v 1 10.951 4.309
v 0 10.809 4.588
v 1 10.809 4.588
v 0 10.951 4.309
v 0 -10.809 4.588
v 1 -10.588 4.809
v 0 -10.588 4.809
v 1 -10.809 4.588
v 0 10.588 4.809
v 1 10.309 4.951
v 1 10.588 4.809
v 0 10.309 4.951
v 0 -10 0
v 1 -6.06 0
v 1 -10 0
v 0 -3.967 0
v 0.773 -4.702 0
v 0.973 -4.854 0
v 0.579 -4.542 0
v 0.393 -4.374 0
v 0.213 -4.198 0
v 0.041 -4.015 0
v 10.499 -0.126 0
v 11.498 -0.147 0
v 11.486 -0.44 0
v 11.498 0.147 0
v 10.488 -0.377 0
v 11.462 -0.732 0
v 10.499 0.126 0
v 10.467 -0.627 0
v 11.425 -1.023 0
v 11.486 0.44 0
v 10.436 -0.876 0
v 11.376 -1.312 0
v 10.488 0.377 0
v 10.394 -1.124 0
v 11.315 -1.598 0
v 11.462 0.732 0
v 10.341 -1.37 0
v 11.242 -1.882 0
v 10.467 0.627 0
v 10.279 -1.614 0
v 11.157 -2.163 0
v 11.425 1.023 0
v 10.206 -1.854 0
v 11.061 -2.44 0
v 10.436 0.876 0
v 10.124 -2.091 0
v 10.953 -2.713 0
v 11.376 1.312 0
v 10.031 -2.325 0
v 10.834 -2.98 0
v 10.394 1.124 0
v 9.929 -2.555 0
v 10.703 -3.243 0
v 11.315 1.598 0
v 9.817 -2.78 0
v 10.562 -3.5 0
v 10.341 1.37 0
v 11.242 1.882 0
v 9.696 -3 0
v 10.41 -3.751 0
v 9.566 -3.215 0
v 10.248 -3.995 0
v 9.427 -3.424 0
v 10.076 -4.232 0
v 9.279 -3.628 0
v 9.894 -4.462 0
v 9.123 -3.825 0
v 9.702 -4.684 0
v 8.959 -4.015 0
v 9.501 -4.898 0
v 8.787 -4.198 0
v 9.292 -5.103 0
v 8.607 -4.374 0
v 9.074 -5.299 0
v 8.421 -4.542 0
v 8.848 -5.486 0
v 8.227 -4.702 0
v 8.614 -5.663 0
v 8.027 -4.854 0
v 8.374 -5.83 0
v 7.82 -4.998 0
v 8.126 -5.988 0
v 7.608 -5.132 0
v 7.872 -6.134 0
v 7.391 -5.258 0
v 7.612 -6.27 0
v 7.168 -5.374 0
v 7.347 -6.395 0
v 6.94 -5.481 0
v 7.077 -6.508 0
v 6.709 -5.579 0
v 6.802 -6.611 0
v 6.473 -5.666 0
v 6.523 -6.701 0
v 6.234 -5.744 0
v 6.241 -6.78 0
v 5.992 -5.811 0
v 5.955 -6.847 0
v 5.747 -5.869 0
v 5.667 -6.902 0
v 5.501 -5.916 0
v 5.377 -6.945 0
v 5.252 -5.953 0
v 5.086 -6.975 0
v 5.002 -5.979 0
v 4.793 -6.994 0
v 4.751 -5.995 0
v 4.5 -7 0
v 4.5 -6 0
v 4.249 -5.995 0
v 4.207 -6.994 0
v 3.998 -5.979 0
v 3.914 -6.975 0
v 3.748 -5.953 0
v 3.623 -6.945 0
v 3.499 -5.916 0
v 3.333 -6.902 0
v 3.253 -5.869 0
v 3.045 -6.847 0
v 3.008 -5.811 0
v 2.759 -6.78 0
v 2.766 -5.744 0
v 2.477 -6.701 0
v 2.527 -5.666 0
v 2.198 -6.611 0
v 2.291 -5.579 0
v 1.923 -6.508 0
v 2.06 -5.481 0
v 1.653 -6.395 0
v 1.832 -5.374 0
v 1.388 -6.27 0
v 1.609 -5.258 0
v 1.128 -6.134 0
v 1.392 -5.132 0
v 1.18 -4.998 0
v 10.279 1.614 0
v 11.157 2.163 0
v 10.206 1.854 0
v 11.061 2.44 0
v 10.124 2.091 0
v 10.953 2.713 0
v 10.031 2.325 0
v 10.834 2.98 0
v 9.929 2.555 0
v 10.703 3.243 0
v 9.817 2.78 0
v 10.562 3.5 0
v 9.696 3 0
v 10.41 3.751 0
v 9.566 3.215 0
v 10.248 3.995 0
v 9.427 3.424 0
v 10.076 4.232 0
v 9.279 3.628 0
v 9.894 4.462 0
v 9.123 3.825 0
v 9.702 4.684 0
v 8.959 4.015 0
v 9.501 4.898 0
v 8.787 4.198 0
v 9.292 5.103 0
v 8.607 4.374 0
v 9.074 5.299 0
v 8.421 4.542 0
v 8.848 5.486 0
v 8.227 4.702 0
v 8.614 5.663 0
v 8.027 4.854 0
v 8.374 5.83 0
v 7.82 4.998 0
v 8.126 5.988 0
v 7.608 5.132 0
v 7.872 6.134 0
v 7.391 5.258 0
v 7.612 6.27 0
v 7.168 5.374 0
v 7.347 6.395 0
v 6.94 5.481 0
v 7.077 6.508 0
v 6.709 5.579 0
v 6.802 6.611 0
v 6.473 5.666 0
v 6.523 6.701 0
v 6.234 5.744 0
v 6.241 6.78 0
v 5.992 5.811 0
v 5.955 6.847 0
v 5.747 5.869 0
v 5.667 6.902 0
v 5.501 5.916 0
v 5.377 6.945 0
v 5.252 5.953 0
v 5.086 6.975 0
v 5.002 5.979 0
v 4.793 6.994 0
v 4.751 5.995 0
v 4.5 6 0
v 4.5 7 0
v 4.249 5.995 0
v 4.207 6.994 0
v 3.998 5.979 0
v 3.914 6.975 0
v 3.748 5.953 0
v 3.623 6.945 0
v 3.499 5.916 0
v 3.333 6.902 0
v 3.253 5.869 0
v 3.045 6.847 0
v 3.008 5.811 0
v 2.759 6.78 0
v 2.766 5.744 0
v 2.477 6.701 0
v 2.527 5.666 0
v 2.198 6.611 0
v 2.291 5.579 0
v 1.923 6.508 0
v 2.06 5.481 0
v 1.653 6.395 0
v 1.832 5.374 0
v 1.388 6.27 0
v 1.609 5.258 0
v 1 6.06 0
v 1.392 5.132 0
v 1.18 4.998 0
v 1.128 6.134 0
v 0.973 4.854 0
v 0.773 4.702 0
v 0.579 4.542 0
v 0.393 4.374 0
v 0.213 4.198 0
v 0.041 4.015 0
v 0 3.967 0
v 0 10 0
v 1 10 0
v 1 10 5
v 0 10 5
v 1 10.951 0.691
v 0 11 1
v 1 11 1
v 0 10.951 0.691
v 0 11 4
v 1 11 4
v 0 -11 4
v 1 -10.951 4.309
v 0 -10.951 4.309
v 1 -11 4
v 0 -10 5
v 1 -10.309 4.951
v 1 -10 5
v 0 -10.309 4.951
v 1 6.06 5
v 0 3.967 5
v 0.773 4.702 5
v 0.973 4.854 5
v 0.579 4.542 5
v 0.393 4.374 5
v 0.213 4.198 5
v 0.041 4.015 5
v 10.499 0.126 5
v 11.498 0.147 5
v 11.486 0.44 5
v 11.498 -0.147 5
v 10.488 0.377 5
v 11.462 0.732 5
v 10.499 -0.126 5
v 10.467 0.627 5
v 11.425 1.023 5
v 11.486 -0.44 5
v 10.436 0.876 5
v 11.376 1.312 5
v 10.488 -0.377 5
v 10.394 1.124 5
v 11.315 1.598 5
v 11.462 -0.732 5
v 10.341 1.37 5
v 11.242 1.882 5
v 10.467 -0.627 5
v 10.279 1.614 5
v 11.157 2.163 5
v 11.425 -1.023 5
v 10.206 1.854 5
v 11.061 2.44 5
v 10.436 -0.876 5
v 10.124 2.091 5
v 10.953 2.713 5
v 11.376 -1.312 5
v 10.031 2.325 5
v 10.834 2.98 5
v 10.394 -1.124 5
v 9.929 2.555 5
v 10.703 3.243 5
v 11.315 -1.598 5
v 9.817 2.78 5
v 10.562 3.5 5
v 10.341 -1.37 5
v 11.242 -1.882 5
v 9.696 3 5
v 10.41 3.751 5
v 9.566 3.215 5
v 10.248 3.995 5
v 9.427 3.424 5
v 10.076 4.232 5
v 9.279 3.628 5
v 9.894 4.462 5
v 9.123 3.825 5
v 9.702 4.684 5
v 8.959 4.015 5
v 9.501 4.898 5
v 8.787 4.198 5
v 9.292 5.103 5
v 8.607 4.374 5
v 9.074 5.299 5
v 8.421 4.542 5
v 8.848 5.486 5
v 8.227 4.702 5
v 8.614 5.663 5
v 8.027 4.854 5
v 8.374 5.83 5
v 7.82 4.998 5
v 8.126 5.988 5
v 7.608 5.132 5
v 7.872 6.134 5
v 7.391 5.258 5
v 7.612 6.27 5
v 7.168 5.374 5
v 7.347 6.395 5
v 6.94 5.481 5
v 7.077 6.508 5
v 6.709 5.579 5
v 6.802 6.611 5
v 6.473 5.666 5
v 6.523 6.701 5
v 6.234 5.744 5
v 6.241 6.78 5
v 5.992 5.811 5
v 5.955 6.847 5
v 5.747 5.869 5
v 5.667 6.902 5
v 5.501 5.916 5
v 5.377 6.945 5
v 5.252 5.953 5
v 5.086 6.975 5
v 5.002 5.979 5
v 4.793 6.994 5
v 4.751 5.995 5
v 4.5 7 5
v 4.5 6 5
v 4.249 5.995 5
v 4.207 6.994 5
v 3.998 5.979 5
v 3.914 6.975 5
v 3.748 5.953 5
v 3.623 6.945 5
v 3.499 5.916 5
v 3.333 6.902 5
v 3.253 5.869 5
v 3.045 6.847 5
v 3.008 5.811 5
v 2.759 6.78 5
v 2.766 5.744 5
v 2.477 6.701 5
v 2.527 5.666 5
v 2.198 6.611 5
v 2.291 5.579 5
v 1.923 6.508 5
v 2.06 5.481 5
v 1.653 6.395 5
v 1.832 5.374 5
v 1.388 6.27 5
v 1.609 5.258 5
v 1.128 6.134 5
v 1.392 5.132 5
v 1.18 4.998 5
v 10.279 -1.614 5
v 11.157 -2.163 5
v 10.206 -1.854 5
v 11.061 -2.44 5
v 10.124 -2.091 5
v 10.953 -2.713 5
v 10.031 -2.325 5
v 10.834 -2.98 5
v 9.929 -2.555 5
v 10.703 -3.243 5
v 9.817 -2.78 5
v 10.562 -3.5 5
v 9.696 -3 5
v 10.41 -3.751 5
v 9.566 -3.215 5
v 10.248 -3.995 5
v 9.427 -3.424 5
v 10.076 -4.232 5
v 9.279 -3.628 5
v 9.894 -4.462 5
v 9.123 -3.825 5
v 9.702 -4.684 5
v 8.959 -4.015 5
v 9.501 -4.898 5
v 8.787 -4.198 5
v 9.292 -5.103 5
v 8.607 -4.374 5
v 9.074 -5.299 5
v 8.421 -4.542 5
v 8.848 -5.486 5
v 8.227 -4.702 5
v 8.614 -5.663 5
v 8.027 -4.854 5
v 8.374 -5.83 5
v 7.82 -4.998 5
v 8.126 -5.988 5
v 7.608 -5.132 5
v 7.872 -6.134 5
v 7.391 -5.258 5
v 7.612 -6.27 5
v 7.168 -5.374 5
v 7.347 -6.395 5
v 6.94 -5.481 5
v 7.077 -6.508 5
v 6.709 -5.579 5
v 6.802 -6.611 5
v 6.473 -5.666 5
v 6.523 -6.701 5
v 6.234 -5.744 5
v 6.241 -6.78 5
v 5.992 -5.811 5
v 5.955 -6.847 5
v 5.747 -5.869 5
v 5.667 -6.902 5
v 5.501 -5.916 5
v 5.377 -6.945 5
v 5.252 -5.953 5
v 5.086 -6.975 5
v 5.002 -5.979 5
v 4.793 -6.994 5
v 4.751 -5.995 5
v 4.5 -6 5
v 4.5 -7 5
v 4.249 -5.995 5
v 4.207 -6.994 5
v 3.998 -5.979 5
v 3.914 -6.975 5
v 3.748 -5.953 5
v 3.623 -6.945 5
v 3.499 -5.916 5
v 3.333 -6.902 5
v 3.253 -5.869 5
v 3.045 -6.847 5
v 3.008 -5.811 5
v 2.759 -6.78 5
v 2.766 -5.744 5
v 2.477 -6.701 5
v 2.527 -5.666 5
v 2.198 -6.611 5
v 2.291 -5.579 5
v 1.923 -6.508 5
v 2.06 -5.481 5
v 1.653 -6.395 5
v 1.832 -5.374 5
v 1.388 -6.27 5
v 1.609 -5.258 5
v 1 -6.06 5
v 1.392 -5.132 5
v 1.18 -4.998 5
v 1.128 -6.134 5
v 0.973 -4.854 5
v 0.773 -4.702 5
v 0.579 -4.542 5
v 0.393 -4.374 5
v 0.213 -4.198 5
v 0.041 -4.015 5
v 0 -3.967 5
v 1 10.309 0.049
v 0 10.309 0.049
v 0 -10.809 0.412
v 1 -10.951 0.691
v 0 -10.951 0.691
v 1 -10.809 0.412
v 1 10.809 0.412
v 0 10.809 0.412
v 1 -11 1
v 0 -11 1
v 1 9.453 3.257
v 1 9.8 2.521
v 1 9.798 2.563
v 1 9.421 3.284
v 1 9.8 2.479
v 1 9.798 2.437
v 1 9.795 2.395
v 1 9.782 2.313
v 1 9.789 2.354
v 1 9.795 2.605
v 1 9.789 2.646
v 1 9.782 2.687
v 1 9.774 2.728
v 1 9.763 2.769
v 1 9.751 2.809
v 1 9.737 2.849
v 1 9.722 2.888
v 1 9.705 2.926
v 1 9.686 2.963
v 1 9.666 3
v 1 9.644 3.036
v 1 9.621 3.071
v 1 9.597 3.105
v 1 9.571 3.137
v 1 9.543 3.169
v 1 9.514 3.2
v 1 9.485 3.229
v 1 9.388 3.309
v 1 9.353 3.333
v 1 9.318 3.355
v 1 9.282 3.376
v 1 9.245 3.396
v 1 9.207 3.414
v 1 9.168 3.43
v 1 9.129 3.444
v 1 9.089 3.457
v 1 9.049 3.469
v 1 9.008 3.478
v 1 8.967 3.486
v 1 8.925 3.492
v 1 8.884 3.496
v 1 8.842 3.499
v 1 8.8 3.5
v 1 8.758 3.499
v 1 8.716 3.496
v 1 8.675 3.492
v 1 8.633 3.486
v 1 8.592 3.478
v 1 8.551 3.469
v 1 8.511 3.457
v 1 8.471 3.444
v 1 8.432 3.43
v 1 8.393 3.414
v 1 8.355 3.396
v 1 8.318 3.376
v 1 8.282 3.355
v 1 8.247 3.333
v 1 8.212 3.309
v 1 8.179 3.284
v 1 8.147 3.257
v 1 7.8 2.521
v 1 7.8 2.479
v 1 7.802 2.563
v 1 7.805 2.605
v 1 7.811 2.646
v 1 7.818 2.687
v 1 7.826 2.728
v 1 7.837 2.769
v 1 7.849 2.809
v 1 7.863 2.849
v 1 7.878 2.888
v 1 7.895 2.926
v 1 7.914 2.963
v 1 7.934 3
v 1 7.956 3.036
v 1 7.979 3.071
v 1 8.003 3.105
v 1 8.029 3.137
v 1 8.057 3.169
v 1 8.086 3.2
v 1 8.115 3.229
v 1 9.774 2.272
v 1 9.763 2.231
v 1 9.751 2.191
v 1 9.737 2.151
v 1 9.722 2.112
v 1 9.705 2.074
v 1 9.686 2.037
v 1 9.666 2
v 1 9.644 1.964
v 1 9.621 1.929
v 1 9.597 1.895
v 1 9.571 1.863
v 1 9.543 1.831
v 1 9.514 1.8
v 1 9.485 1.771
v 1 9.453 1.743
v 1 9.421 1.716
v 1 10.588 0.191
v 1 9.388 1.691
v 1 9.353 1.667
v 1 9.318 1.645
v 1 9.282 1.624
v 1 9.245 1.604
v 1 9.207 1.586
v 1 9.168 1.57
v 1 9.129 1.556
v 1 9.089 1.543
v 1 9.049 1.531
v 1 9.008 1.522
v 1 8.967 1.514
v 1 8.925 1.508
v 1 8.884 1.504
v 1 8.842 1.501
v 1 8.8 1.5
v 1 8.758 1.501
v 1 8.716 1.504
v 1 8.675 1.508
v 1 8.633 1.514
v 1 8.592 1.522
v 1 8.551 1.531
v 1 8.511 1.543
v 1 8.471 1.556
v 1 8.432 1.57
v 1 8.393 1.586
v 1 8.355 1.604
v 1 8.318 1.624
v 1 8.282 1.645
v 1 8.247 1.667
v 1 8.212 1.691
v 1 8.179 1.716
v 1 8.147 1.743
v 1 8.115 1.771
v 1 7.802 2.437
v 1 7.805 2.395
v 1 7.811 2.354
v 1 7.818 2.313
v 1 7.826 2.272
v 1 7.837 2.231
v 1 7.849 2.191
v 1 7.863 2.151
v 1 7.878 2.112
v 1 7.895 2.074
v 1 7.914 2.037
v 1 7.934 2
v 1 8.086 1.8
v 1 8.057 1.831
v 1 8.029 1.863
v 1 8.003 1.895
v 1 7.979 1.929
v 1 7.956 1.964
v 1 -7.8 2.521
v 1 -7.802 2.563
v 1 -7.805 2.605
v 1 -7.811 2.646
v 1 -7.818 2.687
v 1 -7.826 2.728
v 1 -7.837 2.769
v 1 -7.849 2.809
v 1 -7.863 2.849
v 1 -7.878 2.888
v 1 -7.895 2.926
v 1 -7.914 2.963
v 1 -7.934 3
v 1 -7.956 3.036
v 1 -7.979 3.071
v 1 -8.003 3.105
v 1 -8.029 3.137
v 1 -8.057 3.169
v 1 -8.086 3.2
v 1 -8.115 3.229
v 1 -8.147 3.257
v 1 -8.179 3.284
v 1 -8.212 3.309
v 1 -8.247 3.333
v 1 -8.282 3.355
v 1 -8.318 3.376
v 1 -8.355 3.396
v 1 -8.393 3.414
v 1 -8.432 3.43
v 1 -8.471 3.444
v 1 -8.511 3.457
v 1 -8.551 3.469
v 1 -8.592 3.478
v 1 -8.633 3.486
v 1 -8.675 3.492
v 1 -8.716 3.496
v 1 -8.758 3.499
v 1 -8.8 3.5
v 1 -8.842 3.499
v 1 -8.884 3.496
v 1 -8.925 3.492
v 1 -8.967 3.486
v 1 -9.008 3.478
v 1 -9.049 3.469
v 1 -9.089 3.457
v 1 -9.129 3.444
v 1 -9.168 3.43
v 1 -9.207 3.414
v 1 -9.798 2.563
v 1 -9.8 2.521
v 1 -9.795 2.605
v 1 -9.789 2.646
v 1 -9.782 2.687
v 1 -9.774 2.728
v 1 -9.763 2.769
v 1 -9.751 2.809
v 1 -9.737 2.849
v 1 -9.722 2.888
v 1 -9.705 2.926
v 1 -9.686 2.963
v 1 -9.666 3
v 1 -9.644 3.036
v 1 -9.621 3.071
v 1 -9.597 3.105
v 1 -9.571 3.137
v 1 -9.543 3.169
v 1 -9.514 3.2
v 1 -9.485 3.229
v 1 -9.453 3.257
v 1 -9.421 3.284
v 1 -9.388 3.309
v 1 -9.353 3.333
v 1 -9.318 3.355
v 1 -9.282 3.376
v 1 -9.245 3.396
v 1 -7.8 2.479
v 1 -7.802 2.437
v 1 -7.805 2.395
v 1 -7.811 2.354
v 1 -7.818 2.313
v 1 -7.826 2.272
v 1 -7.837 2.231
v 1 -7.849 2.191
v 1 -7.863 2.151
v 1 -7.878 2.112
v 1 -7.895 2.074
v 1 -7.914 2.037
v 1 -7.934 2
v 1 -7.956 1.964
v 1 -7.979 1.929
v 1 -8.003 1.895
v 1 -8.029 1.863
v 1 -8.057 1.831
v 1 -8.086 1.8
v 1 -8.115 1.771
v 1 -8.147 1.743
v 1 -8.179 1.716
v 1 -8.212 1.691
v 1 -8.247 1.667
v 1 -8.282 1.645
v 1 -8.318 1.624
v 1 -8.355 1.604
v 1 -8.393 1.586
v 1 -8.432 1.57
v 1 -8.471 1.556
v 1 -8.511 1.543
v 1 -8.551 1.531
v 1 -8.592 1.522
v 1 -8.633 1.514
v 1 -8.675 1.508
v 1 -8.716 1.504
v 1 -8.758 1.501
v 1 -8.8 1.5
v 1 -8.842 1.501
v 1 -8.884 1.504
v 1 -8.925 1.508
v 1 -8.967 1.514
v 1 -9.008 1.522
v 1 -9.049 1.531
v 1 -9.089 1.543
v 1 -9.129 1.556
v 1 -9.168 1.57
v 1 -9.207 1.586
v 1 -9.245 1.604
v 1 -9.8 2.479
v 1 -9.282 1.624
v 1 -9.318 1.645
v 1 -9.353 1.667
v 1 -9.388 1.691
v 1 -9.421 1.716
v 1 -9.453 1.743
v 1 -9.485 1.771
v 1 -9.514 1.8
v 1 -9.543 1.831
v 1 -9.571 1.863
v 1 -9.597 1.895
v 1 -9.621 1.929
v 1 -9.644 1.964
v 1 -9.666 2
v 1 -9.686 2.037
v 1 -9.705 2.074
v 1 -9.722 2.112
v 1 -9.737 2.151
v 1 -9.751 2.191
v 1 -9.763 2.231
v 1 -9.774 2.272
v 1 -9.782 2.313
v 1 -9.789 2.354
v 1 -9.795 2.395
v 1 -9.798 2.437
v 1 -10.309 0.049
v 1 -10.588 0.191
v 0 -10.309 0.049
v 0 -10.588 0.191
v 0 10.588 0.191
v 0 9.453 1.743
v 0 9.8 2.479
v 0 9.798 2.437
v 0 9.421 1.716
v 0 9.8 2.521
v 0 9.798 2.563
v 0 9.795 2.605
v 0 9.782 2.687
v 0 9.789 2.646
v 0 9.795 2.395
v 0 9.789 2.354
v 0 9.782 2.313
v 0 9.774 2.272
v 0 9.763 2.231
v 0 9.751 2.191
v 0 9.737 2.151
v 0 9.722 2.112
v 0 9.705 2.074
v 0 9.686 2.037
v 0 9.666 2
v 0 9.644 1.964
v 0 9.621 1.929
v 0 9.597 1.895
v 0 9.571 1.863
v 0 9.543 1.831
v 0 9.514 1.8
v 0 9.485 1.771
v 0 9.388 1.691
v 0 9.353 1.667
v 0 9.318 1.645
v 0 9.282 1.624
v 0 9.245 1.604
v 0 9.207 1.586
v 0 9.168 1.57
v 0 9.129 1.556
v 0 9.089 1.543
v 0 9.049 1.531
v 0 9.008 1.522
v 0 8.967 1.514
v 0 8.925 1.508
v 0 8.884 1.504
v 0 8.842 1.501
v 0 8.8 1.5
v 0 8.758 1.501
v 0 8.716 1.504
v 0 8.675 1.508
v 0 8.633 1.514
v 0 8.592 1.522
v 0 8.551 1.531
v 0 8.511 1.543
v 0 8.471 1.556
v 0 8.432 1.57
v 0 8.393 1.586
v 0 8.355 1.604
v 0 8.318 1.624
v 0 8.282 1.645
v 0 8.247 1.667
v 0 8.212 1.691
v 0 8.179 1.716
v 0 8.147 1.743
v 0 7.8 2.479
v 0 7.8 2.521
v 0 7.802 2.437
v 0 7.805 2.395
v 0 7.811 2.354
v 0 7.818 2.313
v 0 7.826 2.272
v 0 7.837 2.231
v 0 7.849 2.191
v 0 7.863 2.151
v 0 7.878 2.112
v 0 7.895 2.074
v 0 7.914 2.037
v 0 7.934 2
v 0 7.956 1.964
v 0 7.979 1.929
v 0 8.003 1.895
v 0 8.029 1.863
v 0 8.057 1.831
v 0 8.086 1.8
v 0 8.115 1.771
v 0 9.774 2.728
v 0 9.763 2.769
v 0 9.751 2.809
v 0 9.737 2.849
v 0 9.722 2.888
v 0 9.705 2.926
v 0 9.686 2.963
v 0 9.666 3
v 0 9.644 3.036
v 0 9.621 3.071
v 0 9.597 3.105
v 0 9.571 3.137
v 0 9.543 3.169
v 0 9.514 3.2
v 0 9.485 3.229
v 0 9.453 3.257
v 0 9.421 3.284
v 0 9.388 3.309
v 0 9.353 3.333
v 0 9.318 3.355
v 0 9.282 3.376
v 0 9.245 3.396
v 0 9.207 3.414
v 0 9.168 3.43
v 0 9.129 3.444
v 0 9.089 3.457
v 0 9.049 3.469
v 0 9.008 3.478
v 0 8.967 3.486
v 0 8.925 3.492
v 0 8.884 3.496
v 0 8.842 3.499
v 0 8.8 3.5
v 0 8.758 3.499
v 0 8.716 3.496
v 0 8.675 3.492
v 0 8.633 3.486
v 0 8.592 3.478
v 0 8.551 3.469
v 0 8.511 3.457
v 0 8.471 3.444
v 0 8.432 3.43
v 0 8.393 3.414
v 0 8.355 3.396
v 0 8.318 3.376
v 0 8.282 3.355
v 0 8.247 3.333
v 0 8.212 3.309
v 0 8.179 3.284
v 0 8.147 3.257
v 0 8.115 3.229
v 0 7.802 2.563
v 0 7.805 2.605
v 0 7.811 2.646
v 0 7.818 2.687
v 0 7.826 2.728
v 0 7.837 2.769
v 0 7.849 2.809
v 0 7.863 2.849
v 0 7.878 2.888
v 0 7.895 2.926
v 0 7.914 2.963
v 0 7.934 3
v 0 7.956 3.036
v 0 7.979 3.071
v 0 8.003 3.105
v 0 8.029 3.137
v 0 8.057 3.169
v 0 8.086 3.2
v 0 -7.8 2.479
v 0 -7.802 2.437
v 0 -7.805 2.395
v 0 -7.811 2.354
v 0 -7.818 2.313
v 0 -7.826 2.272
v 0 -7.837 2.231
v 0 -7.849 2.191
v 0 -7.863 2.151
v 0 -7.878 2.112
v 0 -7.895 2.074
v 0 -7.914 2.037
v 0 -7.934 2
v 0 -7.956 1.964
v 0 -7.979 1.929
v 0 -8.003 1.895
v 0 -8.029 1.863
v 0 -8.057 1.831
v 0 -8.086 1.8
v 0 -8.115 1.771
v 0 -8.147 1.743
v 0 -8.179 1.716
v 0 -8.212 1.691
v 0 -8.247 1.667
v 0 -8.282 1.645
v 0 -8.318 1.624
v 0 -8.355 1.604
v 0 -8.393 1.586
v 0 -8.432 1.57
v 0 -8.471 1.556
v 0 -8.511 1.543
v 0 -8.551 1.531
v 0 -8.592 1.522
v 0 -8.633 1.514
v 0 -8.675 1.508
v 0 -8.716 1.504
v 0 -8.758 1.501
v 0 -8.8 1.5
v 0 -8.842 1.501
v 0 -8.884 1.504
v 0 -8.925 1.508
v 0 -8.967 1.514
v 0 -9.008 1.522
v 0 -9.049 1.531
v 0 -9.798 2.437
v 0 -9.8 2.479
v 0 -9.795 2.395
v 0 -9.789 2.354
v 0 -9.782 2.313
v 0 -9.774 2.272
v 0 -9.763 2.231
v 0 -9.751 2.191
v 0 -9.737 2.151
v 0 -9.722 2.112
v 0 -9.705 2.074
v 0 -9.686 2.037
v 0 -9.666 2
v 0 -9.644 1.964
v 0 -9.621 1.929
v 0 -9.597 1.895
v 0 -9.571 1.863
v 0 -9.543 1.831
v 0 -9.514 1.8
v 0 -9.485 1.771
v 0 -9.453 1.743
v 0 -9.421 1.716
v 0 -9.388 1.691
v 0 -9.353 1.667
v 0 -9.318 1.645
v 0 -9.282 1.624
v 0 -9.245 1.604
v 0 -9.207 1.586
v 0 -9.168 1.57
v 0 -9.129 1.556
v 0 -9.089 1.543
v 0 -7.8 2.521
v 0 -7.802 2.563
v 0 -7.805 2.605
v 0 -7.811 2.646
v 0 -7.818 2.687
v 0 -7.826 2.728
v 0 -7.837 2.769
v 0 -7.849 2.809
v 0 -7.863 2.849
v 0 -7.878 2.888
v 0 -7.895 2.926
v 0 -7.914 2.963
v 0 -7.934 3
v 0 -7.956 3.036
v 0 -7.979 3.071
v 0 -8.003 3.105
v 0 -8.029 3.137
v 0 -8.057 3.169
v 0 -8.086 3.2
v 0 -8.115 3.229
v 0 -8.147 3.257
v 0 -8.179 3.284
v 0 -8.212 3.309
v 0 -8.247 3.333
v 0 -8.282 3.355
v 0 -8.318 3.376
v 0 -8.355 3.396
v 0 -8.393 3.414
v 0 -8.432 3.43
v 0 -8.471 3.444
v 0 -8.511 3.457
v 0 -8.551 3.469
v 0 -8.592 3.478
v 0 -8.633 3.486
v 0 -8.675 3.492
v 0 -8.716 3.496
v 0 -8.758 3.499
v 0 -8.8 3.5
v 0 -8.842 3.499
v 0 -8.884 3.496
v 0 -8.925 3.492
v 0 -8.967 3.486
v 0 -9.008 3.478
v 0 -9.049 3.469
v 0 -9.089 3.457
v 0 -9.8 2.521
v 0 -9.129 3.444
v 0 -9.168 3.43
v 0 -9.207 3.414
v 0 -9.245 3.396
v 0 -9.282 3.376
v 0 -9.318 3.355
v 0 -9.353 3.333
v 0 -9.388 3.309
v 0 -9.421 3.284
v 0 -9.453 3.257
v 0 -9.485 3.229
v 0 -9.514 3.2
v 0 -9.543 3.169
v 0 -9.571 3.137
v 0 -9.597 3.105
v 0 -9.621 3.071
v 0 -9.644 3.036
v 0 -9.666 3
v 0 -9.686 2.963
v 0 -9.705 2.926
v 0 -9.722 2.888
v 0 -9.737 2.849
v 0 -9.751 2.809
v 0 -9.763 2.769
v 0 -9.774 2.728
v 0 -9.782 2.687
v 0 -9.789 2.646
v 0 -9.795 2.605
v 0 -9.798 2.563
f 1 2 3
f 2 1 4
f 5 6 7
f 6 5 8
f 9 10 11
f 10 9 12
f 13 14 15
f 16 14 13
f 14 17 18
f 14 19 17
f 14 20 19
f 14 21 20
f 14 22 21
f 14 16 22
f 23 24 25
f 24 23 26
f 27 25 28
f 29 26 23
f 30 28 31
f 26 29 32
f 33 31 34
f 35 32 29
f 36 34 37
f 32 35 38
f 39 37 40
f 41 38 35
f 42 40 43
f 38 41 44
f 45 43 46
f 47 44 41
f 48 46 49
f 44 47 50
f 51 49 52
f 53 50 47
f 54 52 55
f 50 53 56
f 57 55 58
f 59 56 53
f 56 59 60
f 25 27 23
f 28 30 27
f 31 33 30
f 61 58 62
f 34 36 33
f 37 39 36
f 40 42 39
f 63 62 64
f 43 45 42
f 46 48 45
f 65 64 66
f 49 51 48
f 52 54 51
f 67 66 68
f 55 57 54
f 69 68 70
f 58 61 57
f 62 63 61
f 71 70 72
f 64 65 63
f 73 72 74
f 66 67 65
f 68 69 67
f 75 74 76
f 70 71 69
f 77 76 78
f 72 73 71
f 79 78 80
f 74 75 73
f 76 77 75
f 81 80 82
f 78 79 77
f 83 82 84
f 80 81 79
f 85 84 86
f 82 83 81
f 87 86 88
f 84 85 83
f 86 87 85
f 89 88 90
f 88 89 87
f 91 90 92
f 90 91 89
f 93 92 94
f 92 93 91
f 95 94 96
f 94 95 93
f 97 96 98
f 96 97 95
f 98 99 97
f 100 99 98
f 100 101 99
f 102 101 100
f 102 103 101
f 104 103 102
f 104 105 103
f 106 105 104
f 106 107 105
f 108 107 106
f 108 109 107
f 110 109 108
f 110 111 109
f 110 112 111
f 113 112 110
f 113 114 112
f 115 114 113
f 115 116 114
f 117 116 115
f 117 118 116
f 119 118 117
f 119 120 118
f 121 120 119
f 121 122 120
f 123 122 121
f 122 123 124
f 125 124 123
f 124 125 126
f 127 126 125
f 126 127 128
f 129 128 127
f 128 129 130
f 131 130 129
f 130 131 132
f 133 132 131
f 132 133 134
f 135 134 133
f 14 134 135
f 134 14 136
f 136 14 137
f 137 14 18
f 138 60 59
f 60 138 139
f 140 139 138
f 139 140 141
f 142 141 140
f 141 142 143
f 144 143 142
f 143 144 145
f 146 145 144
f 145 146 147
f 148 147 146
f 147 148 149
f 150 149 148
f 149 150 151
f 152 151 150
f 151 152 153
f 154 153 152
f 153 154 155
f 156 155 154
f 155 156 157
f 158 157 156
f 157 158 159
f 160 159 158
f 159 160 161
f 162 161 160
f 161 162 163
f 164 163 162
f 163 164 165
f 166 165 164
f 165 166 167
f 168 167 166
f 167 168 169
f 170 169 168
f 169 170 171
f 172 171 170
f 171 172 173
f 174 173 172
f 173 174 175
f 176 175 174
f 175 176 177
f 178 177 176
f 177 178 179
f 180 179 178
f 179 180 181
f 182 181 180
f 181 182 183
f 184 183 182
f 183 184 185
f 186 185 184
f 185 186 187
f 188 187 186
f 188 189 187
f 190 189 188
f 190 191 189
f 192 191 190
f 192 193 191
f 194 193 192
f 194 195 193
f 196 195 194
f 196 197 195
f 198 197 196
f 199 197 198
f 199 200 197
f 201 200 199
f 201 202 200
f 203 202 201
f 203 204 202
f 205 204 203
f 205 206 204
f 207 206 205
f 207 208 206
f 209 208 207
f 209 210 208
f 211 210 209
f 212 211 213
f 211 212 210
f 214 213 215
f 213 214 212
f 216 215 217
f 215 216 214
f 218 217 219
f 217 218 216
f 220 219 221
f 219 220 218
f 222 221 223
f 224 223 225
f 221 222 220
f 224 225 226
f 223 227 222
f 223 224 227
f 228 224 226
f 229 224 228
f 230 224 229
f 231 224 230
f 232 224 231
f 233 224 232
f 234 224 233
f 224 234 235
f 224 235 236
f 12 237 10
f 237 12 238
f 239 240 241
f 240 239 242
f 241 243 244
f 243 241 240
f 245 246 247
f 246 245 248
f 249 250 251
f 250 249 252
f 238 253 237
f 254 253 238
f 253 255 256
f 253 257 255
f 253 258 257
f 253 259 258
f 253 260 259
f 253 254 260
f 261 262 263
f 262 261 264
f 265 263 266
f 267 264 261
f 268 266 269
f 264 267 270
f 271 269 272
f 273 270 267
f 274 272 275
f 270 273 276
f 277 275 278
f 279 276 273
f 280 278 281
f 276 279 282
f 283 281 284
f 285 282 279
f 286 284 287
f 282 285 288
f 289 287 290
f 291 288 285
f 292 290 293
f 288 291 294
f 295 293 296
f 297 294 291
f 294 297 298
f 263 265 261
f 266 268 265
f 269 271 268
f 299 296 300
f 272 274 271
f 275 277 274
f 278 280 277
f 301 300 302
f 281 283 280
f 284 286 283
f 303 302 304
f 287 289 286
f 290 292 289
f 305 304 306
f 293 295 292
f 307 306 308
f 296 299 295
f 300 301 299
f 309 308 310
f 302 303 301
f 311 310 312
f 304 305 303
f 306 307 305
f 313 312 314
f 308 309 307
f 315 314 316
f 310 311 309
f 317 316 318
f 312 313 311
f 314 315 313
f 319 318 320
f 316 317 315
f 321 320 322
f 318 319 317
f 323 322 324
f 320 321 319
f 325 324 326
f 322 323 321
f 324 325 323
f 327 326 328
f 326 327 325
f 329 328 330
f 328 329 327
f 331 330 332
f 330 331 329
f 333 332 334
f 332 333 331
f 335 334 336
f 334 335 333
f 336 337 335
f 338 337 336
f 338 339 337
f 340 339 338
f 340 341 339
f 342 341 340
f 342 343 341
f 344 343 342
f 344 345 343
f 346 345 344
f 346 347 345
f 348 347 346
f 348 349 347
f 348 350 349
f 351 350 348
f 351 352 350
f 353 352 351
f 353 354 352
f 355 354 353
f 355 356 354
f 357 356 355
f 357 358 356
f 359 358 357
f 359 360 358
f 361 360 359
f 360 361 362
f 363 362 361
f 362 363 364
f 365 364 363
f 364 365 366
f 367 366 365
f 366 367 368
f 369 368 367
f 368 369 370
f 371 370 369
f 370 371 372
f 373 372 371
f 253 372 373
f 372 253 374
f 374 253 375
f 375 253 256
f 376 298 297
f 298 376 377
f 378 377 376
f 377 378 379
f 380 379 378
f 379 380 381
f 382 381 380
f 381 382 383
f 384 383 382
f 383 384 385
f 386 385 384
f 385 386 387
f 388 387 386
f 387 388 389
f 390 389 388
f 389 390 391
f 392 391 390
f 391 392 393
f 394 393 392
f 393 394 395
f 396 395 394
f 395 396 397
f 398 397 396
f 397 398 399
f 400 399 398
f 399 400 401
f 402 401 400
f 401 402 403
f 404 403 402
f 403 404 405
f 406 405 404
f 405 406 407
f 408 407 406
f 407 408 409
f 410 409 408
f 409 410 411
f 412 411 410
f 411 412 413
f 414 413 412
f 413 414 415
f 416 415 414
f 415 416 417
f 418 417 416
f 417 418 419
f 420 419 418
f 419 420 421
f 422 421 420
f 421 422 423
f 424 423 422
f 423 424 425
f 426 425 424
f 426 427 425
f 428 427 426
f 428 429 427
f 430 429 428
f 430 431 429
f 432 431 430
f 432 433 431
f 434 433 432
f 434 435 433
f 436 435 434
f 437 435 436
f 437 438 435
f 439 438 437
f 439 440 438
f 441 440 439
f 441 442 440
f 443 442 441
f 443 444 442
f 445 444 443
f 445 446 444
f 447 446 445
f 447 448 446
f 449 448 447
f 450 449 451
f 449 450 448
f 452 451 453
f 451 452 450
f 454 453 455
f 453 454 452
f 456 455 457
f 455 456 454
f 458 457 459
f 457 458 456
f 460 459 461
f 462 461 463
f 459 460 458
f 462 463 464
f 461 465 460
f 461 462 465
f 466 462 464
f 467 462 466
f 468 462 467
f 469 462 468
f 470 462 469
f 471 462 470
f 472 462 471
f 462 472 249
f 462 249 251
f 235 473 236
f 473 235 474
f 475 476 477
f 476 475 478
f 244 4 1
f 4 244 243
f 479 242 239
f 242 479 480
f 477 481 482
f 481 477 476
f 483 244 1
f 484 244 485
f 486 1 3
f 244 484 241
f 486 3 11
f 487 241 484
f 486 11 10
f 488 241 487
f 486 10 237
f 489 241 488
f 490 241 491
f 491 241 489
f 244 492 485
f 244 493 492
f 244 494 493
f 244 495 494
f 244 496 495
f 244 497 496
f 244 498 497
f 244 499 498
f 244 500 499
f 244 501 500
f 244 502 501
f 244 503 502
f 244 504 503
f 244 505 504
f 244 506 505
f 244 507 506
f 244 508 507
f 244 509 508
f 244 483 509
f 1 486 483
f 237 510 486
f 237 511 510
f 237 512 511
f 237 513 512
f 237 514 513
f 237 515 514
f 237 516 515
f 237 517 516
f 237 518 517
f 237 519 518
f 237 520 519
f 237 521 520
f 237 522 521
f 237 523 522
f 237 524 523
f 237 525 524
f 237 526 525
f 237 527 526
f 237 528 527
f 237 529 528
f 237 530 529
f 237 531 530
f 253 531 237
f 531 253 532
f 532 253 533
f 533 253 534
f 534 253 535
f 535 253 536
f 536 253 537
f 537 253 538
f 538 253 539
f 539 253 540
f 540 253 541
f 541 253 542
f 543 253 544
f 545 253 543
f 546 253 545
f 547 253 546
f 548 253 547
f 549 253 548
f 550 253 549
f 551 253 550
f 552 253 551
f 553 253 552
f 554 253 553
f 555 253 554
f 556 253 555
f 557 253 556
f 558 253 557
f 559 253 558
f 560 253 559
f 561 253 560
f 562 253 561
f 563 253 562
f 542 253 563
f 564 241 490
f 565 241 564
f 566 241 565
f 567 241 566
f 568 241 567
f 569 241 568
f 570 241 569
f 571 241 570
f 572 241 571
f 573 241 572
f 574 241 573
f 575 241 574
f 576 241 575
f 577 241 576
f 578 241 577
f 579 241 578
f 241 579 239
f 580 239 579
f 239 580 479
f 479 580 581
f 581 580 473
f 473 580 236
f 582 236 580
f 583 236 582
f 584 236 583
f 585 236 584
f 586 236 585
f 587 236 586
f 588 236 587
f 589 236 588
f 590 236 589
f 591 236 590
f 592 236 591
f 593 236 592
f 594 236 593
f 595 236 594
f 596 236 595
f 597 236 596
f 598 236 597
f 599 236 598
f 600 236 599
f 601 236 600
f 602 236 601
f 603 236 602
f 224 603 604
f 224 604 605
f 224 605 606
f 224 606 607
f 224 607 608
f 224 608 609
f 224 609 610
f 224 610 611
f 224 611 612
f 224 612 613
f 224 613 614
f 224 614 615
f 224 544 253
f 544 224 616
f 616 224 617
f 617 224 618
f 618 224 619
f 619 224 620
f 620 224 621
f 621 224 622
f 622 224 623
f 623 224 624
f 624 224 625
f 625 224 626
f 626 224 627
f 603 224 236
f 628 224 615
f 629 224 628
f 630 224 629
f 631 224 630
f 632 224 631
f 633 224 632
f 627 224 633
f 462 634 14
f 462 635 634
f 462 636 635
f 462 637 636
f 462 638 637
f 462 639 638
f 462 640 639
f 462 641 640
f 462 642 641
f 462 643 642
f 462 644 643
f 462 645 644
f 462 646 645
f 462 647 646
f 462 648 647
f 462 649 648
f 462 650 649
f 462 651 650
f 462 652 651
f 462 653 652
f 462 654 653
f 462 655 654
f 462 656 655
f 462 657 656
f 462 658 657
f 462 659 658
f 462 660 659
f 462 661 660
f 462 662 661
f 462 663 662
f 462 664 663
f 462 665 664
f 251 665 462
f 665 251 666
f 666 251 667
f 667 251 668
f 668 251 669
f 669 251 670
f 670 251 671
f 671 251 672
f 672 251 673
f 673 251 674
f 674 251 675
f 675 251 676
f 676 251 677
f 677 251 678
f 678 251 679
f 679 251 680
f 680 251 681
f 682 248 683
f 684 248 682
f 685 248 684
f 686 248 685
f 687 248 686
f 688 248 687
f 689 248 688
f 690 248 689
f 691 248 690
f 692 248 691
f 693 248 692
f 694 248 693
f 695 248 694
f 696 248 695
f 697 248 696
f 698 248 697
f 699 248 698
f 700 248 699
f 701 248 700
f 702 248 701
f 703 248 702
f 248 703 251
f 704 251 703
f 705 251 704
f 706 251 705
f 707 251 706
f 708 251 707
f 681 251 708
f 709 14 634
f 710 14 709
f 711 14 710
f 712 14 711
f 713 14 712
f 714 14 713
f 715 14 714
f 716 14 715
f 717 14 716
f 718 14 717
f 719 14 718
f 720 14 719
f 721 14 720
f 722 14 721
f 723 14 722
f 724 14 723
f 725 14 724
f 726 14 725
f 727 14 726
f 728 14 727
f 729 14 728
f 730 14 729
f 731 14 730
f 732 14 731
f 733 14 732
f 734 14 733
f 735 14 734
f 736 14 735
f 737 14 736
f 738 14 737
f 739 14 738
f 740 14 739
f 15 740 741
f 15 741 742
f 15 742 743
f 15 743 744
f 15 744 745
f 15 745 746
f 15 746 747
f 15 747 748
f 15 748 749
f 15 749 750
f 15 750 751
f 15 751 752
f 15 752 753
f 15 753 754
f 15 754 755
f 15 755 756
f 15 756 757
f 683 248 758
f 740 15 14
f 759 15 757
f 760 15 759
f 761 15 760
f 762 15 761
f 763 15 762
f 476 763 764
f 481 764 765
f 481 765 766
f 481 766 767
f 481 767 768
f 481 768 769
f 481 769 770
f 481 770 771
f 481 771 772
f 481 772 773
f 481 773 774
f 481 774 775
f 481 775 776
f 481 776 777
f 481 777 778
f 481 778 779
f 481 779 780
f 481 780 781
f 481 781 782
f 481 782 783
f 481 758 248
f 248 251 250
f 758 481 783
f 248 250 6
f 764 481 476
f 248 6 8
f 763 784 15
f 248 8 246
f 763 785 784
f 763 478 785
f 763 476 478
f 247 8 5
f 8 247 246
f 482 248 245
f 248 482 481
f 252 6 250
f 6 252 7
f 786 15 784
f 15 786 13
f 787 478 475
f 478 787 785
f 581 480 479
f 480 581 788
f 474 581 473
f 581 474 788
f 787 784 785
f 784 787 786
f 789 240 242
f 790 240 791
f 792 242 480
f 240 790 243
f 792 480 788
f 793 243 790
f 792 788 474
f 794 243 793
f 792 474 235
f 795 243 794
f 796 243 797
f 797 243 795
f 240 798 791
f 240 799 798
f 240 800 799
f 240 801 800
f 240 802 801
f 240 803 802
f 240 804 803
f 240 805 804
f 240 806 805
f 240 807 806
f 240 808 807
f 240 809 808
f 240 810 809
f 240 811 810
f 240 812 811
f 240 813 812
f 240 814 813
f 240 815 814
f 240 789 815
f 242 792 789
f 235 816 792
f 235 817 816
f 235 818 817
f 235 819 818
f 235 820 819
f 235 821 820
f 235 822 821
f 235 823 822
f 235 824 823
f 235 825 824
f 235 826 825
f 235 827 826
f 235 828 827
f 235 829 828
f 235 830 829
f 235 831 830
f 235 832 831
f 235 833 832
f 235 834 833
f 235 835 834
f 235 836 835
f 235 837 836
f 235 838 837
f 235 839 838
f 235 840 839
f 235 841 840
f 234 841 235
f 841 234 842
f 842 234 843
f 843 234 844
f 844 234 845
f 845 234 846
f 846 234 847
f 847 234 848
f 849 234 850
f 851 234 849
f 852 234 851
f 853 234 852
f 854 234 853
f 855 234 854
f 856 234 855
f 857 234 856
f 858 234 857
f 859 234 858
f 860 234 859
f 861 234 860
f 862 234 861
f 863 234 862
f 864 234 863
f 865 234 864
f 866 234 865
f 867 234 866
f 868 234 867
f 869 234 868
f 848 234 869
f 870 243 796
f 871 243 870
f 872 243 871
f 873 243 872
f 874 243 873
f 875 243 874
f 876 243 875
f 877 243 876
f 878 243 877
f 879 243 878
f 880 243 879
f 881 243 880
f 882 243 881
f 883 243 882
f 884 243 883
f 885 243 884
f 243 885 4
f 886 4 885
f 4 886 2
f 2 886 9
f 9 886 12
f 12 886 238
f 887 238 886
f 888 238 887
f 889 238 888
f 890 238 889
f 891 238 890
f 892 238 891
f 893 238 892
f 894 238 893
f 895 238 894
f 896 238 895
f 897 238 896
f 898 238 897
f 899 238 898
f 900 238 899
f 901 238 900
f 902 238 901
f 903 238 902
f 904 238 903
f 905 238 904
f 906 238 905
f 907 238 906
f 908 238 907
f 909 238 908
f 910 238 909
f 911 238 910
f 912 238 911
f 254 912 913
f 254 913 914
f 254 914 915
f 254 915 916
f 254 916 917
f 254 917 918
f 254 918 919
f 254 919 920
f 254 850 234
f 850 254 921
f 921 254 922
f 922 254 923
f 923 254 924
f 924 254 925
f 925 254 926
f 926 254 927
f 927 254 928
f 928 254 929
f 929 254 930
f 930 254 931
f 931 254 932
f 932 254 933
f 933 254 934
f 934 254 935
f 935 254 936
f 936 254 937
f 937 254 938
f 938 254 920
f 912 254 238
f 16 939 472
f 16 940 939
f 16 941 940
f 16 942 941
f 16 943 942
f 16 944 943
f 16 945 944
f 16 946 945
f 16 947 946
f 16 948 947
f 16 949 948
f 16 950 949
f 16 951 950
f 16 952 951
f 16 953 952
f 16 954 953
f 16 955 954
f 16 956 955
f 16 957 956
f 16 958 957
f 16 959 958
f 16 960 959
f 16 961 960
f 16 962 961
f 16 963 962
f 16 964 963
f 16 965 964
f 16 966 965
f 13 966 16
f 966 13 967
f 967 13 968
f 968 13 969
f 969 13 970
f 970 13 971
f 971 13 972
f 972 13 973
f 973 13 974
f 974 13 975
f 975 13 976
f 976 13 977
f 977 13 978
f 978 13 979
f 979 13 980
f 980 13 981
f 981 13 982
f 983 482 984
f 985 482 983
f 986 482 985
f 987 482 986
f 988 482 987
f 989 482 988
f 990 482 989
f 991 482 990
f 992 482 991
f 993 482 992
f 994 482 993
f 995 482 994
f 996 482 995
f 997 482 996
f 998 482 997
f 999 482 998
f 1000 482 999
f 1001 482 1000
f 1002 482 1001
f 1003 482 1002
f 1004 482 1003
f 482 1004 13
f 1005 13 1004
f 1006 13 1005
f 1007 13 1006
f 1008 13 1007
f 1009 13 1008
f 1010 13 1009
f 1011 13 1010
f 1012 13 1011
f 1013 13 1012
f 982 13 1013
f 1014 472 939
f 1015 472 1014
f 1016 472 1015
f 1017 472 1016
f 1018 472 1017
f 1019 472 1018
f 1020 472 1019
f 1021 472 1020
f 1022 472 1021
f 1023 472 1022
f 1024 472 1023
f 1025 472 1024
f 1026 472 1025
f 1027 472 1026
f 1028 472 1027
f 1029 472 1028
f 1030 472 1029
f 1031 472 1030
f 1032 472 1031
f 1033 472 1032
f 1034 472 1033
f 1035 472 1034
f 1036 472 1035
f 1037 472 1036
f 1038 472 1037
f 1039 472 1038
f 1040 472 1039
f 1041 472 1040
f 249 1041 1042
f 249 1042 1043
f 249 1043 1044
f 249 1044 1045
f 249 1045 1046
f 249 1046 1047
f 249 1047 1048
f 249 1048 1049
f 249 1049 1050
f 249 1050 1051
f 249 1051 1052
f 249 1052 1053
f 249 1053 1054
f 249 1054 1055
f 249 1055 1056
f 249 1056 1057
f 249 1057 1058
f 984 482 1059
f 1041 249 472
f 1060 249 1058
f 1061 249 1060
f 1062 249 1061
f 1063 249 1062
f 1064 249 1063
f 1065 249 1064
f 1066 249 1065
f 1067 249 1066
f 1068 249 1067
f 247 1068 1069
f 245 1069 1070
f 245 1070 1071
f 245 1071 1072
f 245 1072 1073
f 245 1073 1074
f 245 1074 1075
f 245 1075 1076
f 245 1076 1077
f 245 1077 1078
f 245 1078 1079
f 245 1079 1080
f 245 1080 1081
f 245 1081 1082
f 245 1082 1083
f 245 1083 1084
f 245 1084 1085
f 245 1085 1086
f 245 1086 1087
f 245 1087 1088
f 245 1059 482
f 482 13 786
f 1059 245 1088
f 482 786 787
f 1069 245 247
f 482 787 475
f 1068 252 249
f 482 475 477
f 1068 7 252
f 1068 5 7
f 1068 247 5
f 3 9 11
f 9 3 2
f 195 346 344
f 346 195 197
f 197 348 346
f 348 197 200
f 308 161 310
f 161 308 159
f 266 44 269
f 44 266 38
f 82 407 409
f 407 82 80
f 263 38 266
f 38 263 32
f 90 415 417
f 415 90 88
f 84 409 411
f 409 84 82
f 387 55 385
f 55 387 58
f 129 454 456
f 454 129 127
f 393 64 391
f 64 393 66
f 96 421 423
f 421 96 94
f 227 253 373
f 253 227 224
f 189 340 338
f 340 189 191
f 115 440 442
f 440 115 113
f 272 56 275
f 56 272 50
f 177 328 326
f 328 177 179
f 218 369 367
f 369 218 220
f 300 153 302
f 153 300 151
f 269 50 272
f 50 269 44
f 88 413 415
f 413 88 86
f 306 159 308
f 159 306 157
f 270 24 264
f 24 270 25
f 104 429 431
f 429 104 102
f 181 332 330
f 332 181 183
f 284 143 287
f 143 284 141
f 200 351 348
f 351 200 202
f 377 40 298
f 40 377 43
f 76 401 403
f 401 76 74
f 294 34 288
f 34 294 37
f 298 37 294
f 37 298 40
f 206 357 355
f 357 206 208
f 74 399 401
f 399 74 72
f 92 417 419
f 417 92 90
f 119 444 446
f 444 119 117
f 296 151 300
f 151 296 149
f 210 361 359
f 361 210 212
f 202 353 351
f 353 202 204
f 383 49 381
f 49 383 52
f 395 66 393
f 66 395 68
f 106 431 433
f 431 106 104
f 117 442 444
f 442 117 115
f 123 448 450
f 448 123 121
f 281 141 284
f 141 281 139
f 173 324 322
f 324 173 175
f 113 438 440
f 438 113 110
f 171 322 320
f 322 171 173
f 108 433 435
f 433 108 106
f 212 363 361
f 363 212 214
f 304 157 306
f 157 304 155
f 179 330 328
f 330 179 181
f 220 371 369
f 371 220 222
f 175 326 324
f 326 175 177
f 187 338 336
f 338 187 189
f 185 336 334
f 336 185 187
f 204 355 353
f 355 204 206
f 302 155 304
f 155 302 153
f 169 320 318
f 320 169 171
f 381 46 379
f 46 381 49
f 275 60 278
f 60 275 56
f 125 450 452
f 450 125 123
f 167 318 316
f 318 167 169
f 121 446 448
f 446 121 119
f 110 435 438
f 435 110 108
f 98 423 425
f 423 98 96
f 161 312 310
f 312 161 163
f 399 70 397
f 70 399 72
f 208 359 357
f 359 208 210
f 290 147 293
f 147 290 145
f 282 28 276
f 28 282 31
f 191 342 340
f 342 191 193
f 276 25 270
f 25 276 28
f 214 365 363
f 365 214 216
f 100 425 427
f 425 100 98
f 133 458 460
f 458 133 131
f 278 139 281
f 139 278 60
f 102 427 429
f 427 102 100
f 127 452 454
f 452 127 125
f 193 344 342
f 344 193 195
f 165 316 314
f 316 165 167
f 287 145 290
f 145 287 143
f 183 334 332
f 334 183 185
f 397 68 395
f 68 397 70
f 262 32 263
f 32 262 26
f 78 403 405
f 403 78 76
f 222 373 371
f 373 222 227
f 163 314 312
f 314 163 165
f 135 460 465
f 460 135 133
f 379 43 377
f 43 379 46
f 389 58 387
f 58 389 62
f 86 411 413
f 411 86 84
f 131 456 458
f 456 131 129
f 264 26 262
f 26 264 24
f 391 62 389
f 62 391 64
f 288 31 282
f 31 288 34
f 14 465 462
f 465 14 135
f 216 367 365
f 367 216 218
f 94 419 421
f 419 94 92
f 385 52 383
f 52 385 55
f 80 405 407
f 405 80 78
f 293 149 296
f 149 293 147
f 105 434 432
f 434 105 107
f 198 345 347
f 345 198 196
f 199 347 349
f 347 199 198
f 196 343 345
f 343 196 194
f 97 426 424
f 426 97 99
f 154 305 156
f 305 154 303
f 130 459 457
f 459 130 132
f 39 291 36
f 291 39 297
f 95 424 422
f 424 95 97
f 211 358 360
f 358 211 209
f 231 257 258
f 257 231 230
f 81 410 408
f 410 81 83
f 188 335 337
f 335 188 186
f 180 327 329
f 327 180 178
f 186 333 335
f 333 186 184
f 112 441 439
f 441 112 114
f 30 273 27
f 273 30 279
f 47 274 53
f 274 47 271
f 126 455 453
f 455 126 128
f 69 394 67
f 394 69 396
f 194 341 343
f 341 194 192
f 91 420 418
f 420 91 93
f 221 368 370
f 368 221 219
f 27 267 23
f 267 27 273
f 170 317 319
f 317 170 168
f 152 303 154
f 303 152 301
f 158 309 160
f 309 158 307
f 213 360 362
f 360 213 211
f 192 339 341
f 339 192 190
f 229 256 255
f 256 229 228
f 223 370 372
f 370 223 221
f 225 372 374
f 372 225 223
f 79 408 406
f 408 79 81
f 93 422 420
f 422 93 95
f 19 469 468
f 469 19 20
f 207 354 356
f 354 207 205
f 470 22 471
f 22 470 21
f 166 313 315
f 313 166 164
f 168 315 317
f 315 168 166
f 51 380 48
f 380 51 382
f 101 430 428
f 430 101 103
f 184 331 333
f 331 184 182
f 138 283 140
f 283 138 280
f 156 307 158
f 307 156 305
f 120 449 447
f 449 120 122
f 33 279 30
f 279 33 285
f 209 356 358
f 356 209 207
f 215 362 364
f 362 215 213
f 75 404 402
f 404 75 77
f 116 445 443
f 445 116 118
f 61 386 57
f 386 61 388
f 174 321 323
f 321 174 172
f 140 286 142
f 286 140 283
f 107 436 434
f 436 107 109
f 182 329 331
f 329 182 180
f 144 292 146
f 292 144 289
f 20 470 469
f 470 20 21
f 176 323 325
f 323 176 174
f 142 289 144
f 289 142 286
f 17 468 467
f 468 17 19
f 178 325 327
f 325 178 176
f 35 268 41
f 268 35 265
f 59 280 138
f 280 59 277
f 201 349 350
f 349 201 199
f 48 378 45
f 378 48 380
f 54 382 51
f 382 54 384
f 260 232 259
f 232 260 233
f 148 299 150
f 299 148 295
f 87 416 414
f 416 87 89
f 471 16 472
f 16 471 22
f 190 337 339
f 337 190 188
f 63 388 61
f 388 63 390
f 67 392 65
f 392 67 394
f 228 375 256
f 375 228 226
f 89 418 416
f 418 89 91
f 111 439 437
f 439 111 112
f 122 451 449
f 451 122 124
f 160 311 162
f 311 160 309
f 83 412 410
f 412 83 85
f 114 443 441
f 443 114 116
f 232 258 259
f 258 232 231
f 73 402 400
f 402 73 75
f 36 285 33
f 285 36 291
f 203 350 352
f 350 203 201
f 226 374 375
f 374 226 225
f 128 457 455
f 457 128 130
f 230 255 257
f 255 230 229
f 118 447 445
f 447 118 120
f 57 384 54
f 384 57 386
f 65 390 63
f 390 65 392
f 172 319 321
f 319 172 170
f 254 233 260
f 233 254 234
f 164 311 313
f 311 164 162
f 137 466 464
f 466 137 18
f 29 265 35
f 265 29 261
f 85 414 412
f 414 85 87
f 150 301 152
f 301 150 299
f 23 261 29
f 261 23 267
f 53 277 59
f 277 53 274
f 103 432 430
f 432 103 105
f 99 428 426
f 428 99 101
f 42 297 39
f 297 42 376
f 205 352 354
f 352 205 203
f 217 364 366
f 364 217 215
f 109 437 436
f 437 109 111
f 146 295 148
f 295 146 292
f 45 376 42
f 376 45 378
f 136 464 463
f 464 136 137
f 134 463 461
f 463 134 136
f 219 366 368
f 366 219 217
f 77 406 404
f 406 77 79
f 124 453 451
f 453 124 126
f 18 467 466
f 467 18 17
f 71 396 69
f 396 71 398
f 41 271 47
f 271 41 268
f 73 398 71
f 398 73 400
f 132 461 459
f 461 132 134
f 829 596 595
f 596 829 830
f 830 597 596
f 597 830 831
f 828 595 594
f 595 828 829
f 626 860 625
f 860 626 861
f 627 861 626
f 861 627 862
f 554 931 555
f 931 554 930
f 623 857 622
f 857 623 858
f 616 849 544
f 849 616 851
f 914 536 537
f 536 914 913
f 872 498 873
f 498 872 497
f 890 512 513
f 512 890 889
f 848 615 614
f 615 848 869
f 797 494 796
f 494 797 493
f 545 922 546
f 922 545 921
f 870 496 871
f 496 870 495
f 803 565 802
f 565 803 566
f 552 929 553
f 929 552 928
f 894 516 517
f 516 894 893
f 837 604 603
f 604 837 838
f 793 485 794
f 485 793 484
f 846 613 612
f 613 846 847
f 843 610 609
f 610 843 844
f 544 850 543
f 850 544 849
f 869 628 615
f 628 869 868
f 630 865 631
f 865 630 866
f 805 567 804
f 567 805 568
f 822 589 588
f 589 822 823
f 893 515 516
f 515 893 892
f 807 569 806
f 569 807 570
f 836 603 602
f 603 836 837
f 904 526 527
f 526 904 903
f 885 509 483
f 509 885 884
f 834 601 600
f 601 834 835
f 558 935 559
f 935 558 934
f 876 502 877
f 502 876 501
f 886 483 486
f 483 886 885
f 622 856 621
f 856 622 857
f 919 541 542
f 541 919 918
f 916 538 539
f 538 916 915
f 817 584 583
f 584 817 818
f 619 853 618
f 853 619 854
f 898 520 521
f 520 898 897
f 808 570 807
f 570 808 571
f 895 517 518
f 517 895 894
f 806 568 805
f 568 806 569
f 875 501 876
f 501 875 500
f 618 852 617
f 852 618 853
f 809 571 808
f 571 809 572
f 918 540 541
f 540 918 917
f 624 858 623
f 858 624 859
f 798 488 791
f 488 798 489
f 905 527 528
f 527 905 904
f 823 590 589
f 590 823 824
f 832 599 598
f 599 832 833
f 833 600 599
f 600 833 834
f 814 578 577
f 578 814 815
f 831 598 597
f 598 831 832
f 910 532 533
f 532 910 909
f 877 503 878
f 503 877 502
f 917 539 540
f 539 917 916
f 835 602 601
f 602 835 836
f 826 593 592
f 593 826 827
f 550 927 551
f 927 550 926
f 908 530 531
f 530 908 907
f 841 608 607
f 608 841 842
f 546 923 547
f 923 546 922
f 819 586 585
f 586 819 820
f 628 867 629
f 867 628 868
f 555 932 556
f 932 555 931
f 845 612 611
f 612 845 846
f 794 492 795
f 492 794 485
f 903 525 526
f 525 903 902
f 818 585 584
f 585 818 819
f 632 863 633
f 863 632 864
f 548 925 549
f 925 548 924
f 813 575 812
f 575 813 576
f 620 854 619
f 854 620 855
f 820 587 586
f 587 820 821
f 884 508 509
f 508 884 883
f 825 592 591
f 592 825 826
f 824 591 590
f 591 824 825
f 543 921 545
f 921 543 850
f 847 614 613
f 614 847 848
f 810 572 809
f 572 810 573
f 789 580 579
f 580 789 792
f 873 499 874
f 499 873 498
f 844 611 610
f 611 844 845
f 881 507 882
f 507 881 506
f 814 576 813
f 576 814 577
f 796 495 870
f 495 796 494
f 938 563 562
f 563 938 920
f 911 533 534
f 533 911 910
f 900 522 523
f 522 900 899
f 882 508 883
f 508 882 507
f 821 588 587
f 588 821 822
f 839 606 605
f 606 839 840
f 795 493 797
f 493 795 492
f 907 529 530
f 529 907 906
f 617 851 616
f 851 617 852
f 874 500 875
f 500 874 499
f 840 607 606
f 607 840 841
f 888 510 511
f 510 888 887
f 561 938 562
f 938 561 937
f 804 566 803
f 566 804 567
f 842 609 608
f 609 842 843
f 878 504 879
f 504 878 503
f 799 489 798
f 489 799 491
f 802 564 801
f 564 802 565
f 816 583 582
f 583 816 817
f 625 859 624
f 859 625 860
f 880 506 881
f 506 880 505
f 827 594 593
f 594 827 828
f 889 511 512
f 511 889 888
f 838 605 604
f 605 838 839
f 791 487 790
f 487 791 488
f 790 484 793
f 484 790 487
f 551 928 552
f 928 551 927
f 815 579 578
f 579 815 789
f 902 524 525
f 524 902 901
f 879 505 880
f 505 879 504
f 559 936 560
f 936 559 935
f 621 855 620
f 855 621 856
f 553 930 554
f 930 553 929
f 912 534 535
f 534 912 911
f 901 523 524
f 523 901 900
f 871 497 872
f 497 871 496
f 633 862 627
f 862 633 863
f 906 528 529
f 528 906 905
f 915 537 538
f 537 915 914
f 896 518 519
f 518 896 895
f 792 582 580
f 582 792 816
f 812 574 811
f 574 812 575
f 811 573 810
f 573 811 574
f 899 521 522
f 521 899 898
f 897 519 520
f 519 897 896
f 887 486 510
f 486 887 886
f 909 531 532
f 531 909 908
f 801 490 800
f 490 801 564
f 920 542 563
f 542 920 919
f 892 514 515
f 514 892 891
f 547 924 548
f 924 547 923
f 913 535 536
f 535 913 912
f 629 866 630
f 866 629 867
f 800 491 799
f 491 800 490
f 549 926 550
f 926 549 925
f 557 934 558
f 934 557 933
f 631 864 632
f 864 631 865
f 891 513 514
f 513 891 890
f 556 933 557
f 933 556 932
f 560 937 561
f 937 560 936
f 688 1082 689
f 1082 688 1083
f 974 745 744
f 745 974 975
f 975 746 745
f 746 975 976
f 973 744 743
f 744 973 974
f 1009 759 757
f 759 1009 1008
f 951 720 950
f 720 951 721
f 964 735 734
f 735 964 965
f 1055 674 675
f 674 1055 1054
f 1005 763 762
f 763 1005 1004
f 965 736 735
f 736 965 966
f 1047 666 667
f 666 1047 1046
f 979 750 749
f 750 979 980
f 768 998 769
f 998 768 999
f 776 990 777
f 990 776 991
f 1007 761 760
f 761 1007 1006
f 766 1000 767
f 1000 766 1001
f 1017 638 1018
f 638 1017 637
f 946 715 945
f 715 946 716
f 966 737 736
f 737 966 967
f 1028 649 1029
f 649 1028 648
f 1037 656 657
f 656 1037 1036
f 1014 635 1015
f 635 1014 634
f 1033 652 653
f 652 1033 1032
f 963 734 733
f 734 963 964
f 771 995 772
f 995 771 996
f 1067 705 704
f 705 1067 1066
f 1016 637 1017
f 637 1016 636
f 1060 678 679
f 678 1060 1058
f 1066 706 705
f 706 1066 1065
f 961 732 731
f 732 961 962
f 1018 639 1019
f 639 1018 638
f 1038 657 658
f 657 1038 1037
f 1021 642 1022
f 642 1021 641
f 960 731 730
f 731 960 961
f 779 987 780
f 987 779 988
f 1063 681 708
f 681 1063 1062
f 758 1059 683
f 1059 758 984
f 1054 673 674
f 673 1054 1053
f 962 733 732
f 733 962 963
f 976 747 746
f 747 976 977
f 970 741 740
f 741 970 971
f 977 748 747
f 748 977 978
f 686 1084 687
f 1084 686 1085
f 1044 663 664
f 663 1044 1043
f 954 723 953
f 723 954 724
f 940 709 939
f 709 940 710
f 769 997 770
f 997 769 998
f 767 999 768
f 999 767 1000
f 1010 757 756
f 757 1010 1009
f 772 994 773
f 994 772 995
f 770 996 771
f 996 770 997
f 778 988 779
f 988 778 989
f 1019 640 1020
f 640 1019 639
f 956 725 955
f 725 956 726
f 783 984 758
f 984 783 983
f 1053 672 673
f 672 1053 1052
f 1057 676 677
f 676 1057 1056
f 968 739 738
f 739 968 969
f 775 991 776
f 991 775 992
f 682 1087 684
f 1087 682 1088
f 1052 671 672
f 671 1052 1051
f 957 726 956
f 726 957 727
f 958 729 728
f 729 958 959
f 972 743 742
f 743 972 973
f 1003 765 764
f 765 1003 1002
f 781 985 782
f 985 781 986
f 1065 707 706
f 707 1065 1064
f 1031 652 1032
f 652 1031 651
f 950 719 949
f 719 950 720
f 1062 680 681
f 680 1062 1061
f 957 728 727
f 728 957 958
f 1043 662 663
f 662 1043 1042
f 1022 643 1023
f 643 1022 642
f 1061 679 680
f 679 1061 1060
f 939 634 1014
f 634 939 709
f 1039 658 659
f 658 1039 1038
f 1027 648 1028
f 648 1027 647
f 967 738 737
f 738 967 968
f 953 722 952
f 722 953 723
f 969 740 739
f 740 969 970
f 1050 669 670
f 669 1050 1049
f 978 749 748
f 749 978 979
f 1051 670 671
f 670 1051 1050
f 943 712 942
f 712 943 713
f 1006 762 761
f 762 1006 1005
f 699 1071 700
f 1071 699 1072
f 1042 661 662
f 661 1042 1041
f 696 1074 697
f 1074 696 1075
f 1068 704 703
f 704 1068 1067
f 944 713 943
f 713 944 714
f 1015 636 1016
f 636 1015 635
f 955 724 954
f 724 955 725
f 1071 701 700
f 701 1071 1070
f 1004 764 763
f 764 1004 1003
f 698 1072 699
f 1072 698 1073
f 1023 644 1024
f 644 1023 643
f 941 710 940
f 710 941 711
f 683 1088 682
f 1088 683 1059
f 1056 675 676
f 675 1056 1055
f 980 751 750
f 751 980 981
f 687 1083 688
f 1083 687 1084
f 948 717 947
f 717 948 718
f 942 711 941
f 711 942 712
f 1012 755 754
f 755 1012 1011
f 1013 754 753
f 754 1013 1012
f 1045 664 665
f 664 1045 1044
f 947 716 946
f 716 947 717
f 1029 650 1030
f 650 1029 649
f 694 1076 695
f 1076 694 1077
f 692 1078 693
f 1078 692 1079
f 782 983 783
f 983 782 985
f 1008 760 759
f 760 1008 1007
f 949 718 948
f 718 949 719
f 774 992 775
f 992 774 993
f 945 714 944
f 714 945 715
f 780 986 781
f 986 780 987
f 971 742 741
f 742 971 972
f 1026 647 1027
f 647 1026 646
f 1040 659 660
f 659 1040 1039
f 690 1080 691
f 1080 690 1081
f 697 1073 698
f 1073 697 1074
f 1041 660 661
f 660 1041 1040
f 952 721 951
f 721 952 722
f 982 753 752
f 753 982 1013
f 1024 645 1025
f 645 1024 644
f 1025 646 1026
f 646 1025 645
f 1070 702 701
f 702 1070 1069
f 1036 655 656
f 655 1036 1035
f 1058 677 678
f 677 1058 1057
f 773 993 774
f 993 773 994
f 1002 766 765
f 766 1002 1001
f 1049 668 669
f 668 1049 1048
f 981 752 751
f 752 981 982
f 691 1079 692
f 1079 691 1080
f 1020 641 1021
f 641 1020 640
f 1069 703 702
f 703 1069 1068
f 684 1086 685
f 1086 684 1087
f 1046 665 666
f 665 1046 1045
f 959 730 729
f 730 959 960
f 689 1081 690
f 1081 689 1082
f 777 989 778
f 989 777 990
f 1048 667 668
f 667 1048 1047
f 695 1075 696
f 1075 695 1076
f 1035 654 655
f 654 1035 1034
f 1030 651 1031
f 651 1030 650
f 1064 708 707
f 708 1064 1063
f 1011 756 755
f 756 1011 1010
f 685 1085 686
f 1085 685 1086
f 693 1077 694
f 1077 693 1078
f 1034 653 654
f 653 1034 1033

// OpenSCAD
h = 5;
w = 22;
d = 1;
o = 2.2;
r1 = 6;
r2 = 1;
b = 4.5; //vertical bump

$fn = 150;



translate([0, 0, h/2]) rotate([0, 90, 0]) difference() {
    union() {
        hull() standoffs(1, d, h, w);
        translate([0, 0, b]) rotate([90, 0, 90]) cylinder(h, r1+d, r1+d, center=true);
    }
    union() {
        translate([0, 0, b]) rotate([90, 0, 90]) cylinder(h, r1, r1, center=true);  
        translate([0, 0, -h]) cube([h, w, h*2], center=true);
        translate([0, w/2 - o]) cylinder(d, r2, r2);
        translate([0, -w/2 + o]) cylinder(d, r2, r2);
    }
}


module standoffs(r, depth, height, width) {
    $fn = 20;
    d = depth;
    x = height / 2 -r;
    y = width / 2 -r;
    
    union() { 
        translate([x, y]) cylinder(d, r, r);
        translate([x, -y]) cylinder(d, r, r);
        translate([-x, y]) cylinder(d, r, r);
        translate([-x, -y]) cylinder(d, r, r);
    }
}
